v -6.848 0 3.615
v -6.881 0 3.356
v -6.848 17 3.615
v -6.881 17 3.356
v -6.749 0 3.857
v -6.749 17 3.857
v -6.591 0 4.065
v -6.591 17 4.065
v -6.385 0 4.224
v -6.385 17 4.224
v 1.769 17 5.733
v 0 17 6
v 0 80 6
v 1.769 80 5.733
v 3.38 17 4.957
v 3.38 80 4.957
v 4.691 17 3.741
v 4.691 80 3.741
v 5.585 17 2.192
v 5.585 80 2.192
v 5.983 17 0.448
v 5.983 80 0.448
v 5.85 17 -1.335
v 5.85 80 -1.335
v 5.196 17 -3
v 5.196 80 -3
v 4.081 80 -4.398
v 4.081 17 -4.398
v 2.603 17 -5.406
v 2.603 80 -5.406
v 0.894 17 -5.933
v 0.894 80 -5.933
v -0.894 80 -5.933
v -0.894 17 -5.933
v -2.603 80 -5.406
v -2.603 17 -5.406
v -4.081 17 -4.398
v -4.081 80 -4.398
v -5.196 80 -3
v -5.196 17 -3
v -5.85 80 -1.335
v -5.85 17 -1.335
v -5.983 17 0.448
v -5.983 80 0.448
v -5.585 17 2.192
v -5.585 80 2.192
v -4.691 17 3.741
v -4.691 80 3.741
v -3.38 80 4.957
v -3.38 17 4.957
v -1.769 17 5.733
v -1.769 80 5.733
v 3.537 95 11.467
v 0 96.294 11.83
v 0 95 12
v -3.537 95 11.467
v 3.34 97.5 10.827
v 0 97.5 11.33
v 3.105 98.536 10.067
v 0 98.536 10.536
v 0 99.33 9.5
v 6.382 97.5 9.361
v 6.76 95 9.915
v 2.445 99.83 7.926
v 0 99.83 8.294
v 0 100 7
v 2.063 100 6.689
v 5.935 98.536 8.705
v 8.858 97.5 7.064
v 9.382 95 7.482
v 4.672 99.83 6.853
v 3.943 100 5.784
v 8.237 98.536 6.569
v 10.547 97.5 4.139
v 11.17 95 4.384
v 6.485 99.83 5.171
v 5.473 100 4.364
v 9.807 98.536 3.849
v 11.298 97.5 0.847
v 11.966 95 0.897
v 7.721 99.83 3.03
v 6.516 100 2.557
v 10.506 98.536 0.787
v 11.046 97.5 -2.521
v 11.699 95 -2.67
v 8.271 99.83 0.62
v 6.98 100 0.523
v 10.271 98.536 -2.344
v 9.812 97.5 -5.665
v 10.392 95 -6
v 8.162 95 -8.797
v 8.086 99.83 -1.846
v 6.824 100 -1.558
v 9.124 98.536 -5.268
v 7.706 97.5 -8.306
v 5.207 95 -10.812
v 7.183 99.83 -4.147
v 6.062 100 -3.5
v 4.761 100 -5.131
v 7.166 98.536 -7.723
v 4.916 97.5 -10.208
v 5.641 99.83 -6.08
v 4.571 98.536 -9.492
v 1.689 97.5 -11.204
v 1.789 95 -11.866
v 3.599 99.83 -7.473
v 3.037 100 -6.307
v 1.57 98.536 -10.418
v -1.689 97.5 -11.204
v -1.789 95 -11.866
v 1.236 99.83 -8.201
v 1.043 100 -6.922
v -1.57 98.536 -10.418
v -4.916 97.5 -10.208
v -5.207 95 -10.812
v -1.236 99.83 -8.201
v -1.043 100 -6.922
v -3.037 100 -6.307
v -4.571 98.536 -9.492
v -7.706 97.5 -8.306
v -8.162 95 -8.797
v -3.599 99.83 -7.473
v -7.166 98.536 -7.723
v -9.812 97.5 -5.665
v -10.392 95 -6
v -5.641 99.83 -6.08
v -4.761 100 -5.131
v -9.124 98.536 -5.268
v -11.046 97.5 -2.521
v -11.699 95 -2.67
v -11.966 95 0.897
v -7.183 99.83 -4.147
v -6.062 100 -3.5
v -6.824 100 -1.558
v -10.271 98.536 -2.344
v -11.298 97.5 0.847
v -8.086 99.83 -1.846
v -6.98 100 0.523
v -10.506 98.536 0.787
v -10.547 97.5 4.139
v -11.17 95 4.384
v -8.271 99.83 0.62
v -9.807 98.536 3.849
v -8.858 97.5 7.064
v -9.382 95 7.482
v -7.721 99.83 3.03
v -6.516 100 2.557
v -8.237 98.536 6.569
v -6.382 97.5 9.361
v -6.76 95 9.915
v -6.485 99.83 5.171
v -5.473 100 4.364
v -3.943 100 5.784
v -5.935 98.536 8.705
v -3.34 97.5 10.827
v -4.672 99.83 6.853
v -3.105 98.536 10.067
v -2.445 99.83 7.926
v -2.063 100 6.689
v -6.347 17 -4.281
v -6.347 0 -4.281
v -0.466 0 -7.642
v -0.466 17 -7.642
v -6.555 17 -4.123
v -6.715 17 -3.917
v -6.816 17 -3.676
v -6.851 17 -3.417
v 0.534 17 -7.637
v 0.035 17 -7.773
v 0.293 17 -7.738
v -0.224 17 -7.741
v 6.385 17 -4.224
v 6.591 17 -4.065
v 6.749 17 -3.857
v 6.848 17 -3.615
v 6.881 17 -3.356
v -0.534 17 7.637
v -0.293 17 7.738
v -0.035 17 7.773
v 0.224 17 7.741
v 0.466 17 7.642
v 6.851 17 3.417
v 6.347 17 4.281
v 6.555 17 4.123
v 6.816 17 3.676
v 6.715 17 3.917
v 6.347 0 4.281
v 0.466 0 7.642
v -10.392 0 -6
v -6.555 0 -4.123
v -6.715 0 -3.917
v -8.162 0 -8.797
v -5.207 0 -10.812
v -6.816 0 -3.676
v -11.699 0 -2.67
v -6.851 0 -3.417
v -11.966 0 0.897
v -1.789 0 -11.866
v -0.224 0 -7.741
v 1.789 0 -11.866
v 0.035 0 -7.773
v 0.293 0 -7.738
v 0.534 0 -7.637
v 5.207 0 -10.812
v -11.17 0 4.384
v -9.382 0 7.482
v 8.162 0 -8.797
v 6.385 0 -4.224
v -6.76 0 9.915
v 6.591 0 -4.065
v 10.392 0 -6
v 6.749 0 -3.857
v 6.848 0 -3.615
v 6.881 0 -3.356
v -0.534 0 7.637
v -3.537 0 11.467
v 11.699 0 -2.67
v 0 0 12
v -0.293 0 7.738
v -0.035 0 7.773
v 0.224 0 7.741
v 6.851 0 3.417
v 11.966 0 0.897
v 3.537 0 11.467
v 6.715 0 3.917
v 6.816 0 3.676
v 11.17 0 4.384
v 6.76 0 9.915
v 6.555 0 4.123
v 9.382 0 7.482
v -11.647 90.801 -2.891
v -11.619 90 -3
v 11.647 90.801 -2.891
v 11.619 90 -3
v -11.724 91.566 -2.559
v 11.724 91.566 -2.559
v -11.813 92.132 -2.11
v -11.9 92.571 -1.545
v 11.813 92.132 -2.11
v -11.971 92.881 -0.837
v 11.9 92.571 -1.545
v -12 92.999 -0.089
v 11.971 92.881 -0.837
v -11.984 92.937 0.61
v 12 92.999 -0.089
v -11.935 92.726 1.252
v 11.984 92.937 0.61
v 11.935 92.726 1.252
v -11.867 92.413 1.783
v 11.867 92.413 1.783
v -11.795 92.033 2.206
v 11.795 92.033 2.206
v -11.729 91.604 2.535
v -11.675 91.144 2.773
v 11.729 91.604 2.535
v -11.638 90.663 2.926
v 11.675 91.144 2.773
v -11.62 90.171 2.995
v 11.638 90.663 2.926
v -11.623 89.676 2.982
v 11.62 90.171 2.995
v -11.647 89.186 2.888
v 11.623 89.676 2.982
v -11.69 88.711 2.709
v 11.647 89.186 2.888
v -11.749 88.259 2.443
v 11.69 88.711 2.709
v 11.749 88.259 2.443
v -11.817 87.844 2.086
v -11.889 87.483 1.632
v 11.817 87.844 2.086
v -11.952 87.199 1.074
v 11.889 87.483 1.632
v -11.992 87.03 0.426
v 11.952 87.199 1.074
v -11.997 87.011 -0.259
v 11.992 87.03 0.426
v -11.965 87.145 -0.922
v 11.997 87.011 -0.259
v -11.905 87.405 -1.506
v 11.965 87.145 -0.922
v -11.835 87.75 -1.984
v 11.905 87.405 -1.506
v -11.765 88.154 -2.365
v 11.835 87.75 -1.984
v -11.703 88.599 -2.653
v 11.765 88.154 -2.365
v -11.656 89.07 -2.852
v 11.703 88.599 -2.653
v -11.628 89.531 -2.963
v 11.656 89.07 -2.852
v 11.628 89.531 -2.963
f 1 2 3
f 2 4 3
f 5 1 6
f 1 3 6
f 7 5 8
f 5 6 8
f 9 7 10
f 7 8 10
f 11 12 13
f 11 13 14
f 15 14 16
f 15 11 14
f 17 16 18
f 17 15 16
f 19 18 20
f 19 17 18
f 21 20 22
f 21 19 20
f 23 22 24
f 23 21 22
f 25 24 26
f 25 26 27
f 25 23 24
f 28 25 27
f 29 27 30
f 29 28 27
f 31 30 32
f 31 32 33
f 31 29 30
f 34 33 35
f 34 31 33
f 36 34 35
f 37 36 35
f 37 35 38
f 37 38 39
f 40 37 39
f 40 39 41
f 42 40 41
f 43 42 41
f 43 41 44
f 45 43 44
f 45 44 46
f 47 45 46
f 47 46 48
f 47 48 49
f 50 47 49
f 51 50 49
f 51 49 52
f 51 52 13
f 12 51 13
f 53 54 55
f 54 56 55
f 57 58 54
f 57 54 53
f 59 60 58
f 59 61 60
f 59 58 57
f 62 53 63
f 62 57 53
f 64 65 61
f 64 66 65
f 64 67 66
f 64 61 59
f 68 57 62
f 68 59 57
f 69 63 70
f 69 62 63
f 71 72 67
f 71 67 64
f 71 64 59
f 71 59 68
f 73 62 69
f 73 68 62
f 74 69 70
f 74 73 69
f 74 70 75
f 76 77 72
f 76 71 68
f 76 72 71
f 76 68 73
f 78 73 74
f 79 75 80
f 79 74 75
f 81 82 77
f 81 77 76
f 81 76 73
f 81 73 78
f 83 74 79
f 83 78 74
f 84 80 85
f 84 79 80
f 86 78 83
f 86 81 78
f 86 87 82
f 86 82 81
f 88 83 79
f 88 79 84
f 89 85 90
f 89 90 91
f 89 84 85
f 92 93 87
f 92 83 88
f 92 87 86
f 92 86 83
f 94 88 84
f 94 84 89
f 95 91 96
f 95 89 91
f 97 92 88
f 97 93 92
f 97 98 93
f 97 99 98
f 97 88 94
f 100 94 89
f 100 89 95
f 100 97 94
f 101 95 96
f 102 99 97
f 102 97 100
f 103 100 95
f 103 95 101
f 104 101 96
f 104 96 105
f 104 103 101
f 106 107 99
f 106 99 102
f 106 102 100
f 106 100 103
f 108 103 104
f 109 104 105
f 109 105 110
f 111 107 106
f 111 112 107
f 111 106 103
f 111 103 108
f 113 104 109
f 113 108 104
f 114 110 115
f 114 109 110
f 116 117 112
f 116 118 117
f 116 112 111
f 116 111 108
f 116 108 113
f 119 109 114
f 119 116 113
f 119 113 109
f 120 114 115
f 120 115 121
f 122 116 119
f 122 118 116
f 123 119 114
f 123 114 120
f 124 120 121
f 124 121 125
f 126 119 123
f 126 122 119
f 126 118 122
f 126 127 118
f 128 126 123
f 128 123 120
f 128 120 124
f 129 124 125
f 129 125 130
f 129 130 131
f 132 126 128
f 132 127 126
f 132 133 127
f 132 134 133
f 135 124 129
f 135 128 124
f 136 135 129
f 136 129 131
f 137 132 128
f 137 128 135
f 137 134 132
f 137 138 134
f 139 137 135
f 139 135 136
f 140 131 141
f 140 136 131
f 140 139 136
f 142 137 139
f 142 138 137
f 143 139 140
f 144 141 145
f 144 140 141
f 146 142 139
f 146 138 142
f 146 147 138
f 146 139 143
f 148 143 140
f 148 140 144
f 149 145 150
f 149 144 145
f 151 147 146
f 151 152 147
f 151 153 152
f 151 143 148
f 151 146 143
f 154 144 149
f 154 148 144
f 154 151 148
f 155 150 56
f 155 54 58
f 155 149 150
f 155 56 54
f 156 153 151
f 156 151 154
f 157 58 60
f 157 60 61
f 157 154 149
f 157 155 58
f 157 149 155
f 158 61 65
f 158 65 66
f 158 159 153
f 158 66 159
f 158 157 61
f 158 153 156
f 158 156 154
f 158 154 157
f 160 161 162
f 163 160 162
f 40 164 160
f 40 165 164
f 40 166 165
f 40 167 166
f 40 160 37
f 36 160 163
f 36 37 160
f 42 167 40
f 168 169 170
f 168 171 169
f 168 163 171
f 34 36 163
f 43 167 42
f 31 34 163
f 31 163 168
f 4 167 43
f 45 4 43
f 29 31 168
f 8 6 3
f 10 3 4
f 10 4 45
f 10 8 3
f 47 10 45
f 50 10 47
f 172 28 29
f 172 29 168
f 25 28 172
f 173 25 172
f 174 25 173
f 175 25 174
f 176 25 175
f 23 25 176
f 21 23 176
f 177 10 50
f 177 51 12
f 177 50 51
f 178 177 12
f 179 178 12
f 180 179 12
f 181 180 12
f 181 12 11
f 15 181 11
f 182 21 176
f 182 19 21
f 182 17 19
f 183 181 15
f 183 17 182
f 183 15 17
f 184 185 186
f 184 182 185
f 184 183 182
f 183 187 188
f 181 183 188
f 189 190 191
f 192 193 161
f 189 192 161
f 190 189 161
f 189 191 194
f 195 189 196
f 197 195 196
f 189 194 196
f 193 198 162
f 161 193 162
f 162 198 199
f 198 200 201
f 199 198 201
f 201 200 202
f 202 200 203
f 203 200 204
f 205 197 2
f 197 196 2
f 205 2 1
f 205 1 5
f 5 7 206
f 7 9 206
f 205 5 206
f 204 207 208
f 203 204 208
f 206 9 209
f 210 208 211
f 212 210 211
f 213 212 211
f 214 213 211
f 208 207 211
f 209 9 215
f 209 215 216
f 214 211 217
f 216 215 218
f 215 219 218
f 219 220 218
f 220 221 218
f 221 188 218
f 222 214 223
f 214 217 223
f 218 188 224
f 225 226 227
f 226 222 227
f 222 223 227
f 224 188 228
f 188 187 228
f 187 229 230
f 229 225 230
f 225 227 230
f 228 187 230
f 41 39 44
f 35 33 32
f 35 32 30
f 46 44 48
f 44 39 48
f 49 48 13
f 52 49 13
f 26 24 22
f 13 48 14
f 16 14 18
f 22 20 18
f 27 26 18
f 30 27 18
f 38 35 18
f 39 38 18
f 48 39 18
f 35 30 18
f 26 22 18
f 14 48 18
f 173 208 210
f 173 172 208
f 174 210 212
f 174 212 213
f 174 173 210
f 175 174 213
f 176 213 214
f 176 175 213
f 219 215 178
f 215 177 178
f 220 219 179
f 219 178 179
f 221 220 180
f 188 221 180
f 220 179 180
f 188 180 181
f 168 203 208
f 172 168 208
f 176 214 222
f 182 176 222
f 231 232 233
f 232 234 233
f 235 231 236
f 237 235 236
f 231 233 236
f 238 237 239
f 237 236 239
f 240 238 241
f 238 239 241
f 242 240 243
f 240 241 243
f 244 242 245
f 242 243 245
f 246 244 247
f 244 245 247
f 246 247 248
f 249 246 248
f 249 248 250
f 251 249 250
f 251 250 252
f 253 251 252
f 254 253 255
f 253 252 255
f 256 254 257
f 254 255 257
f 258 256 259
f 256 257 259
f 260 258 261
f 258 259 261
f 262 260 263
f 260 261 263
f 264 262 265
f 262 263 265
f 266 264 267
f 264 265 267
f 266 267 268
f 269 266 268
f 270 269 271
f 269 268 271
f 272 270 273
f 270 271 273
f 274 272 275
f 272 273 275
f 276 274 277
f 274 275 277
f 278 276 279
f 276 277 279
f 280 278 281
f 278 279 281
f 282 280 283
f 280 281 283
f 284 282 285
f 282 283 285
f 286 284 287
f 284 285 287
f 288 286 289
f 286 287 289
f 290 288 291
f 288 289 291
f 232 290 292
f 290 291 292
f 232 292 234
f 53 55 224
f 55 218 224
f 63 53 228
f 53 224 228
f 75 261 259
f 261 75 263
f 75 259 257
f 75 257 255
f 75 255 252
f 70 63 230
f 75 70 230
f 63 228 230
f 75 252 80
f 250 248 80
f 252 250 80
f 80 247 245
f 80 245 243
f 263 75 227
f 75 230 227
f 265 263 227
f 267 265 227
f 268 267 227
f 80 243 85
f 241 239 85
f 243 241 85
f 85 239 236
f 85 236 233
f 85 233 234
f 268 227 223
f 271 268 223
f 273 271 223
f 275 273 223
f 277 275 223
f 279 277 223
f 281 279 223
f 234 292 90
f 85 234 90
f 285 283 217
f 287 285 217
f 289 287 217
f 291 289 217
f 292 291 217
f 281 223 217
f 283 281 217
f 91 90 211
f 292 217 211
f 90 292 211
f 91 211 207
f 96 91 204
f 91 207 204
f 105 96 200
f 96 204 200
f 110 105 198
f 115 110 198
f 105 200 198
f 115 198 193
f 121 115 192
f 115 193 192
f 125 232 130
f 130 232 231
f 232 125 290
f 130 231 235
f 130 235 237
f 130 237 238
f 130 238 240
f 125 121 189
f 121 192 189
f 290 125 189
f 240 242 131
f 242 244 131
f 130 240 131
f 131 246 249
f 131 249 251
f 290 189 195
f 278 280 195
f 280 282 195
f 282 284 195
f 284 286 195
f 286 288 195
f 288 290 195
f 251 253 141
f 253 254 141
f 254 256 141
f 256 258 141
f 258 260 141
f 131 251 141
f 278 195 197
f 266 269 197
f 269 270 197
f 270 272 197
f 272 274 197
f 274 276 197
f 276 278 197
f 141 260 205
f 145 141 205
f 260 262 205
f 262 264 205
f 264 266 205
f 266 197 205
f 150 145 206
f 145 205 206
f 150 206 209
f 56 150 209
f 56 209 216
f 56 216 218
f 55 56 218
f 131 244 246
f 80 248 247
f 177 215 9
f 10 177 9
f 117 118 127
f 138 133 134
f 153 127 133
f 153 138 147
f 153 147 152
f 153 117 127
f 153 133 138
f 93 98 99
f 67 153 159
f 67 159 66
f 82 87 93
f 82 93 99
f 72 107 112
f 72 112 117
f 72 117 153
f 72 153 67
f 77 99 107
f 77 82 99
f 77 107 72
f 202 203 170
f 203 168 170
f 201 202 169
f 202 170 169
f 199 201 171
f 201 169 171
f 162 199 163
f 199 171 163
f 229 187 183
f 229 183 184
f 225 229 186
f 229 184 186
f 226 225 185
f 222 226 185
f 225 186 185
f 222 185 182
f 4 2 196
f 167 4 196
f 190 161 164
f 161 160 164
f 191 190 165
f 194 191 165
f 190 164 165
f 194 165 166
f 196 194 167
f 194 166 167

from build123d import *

# Parameters (mm, degrees)
SKETCH_1_R          = 12
SKETCH_1_R_2        = 6
EXTRUDE_1_DEPTH     = 80
CUT_EXTRUDE_1_DEPTH = 17
FILLET_1_R          = 1
SKETCH_3_R          = 12
EXTRUDE_2_DEPTH     = 20
FILLET_2_R          = 5
SKETCH_4_R          = 3
CUT_EXTRUDE_3_DEPTH = 22.5


with BuildPart() as part:
    # Эскиз1 → Вытянуть1 (new body)
    with BuildSketch(Plane(origin=(0, 0, 0), x_dir=(1, 0, 0), z_dir=(0, 1, 0))):
        with Locations(Location((0, 0, 0), (0, 0, 270))):
            Circle(SKETCH_1_R)
        with Locations(Location((0, 0, 0), (0, 0, 270))):
            Circle(SKETCH_1_R_2, mode=Mode.SUBTRACT)
    extrude(amount=EXTRUDE_1_DEPTH)

    # Эскиз2 → Вырез-Вытянуть1 (cut)
    with BuildSketch(Plane.XZ):
        Polygon((6.883625854, -3.933459236), (6.84828855, 3.994665242), (-0.035337304, 7.928124478), (-6.883625854, 3.933459236), (-6.84828855, -3.994665242), (0.035337304, -7.928124478), align=None)
    extrude(amount=-CUT_EXTRUDE_1_DEPTH, mode=Mode.SUBTRACT)

    # Скругление1
    fillet_1_edges = [part.edges().sort_by_distance(p)[0] for p in [
        (6.883625854, 8.5, -3.933459236),
        (0.035337304, 8.5, -7.928124478),
        (-6.84828855, 8.5, -3.994665242),
        (-6.883625854, 8.5, 3.933459236),
        (-0.035337304, 8.5, 7.928124478),
        (6.84828855, 8.5, 3.994665242),
    ]]
    fillet(fillet_1_edges, radius=FILLET_1_R)

    # Эскиз3 → Вытянуть2 (add)
    with BuildSketch(Plane(origin=(0, 80, 0), x_dir=(1, 0, 0), z_dir=(0, 1, 0))):
        with Locations(Location((0, 0, 0), (0, 0, 270))):
            Circle(SKETCH_3_R)
    extrude(amount=EXTRUDE_2_DEPTH)

    # Скругление2
    fillet_2_edges = [part.edges().sort_by_distance(p)[0] for p in [
        (0, 100, -12),
    ]]
    fillet(fillet_2_edges, radius=FILLET_2_R)

    # Эскиз4 → Вытянуть3 (cut, symmetric)
    with BuildSketch(Plane(origin=(0, 0, 0), x_dir=(0, 0, -1), z_dir=(1, 0, 0))):
        with Locations((0, 90)):
            Circle(SKETCH_4_R)
    extrude(amount=CUT_EXTRUDE_3_DEPTH, both=True, mode=Mode.SUBTRACT)


solid = part.part
